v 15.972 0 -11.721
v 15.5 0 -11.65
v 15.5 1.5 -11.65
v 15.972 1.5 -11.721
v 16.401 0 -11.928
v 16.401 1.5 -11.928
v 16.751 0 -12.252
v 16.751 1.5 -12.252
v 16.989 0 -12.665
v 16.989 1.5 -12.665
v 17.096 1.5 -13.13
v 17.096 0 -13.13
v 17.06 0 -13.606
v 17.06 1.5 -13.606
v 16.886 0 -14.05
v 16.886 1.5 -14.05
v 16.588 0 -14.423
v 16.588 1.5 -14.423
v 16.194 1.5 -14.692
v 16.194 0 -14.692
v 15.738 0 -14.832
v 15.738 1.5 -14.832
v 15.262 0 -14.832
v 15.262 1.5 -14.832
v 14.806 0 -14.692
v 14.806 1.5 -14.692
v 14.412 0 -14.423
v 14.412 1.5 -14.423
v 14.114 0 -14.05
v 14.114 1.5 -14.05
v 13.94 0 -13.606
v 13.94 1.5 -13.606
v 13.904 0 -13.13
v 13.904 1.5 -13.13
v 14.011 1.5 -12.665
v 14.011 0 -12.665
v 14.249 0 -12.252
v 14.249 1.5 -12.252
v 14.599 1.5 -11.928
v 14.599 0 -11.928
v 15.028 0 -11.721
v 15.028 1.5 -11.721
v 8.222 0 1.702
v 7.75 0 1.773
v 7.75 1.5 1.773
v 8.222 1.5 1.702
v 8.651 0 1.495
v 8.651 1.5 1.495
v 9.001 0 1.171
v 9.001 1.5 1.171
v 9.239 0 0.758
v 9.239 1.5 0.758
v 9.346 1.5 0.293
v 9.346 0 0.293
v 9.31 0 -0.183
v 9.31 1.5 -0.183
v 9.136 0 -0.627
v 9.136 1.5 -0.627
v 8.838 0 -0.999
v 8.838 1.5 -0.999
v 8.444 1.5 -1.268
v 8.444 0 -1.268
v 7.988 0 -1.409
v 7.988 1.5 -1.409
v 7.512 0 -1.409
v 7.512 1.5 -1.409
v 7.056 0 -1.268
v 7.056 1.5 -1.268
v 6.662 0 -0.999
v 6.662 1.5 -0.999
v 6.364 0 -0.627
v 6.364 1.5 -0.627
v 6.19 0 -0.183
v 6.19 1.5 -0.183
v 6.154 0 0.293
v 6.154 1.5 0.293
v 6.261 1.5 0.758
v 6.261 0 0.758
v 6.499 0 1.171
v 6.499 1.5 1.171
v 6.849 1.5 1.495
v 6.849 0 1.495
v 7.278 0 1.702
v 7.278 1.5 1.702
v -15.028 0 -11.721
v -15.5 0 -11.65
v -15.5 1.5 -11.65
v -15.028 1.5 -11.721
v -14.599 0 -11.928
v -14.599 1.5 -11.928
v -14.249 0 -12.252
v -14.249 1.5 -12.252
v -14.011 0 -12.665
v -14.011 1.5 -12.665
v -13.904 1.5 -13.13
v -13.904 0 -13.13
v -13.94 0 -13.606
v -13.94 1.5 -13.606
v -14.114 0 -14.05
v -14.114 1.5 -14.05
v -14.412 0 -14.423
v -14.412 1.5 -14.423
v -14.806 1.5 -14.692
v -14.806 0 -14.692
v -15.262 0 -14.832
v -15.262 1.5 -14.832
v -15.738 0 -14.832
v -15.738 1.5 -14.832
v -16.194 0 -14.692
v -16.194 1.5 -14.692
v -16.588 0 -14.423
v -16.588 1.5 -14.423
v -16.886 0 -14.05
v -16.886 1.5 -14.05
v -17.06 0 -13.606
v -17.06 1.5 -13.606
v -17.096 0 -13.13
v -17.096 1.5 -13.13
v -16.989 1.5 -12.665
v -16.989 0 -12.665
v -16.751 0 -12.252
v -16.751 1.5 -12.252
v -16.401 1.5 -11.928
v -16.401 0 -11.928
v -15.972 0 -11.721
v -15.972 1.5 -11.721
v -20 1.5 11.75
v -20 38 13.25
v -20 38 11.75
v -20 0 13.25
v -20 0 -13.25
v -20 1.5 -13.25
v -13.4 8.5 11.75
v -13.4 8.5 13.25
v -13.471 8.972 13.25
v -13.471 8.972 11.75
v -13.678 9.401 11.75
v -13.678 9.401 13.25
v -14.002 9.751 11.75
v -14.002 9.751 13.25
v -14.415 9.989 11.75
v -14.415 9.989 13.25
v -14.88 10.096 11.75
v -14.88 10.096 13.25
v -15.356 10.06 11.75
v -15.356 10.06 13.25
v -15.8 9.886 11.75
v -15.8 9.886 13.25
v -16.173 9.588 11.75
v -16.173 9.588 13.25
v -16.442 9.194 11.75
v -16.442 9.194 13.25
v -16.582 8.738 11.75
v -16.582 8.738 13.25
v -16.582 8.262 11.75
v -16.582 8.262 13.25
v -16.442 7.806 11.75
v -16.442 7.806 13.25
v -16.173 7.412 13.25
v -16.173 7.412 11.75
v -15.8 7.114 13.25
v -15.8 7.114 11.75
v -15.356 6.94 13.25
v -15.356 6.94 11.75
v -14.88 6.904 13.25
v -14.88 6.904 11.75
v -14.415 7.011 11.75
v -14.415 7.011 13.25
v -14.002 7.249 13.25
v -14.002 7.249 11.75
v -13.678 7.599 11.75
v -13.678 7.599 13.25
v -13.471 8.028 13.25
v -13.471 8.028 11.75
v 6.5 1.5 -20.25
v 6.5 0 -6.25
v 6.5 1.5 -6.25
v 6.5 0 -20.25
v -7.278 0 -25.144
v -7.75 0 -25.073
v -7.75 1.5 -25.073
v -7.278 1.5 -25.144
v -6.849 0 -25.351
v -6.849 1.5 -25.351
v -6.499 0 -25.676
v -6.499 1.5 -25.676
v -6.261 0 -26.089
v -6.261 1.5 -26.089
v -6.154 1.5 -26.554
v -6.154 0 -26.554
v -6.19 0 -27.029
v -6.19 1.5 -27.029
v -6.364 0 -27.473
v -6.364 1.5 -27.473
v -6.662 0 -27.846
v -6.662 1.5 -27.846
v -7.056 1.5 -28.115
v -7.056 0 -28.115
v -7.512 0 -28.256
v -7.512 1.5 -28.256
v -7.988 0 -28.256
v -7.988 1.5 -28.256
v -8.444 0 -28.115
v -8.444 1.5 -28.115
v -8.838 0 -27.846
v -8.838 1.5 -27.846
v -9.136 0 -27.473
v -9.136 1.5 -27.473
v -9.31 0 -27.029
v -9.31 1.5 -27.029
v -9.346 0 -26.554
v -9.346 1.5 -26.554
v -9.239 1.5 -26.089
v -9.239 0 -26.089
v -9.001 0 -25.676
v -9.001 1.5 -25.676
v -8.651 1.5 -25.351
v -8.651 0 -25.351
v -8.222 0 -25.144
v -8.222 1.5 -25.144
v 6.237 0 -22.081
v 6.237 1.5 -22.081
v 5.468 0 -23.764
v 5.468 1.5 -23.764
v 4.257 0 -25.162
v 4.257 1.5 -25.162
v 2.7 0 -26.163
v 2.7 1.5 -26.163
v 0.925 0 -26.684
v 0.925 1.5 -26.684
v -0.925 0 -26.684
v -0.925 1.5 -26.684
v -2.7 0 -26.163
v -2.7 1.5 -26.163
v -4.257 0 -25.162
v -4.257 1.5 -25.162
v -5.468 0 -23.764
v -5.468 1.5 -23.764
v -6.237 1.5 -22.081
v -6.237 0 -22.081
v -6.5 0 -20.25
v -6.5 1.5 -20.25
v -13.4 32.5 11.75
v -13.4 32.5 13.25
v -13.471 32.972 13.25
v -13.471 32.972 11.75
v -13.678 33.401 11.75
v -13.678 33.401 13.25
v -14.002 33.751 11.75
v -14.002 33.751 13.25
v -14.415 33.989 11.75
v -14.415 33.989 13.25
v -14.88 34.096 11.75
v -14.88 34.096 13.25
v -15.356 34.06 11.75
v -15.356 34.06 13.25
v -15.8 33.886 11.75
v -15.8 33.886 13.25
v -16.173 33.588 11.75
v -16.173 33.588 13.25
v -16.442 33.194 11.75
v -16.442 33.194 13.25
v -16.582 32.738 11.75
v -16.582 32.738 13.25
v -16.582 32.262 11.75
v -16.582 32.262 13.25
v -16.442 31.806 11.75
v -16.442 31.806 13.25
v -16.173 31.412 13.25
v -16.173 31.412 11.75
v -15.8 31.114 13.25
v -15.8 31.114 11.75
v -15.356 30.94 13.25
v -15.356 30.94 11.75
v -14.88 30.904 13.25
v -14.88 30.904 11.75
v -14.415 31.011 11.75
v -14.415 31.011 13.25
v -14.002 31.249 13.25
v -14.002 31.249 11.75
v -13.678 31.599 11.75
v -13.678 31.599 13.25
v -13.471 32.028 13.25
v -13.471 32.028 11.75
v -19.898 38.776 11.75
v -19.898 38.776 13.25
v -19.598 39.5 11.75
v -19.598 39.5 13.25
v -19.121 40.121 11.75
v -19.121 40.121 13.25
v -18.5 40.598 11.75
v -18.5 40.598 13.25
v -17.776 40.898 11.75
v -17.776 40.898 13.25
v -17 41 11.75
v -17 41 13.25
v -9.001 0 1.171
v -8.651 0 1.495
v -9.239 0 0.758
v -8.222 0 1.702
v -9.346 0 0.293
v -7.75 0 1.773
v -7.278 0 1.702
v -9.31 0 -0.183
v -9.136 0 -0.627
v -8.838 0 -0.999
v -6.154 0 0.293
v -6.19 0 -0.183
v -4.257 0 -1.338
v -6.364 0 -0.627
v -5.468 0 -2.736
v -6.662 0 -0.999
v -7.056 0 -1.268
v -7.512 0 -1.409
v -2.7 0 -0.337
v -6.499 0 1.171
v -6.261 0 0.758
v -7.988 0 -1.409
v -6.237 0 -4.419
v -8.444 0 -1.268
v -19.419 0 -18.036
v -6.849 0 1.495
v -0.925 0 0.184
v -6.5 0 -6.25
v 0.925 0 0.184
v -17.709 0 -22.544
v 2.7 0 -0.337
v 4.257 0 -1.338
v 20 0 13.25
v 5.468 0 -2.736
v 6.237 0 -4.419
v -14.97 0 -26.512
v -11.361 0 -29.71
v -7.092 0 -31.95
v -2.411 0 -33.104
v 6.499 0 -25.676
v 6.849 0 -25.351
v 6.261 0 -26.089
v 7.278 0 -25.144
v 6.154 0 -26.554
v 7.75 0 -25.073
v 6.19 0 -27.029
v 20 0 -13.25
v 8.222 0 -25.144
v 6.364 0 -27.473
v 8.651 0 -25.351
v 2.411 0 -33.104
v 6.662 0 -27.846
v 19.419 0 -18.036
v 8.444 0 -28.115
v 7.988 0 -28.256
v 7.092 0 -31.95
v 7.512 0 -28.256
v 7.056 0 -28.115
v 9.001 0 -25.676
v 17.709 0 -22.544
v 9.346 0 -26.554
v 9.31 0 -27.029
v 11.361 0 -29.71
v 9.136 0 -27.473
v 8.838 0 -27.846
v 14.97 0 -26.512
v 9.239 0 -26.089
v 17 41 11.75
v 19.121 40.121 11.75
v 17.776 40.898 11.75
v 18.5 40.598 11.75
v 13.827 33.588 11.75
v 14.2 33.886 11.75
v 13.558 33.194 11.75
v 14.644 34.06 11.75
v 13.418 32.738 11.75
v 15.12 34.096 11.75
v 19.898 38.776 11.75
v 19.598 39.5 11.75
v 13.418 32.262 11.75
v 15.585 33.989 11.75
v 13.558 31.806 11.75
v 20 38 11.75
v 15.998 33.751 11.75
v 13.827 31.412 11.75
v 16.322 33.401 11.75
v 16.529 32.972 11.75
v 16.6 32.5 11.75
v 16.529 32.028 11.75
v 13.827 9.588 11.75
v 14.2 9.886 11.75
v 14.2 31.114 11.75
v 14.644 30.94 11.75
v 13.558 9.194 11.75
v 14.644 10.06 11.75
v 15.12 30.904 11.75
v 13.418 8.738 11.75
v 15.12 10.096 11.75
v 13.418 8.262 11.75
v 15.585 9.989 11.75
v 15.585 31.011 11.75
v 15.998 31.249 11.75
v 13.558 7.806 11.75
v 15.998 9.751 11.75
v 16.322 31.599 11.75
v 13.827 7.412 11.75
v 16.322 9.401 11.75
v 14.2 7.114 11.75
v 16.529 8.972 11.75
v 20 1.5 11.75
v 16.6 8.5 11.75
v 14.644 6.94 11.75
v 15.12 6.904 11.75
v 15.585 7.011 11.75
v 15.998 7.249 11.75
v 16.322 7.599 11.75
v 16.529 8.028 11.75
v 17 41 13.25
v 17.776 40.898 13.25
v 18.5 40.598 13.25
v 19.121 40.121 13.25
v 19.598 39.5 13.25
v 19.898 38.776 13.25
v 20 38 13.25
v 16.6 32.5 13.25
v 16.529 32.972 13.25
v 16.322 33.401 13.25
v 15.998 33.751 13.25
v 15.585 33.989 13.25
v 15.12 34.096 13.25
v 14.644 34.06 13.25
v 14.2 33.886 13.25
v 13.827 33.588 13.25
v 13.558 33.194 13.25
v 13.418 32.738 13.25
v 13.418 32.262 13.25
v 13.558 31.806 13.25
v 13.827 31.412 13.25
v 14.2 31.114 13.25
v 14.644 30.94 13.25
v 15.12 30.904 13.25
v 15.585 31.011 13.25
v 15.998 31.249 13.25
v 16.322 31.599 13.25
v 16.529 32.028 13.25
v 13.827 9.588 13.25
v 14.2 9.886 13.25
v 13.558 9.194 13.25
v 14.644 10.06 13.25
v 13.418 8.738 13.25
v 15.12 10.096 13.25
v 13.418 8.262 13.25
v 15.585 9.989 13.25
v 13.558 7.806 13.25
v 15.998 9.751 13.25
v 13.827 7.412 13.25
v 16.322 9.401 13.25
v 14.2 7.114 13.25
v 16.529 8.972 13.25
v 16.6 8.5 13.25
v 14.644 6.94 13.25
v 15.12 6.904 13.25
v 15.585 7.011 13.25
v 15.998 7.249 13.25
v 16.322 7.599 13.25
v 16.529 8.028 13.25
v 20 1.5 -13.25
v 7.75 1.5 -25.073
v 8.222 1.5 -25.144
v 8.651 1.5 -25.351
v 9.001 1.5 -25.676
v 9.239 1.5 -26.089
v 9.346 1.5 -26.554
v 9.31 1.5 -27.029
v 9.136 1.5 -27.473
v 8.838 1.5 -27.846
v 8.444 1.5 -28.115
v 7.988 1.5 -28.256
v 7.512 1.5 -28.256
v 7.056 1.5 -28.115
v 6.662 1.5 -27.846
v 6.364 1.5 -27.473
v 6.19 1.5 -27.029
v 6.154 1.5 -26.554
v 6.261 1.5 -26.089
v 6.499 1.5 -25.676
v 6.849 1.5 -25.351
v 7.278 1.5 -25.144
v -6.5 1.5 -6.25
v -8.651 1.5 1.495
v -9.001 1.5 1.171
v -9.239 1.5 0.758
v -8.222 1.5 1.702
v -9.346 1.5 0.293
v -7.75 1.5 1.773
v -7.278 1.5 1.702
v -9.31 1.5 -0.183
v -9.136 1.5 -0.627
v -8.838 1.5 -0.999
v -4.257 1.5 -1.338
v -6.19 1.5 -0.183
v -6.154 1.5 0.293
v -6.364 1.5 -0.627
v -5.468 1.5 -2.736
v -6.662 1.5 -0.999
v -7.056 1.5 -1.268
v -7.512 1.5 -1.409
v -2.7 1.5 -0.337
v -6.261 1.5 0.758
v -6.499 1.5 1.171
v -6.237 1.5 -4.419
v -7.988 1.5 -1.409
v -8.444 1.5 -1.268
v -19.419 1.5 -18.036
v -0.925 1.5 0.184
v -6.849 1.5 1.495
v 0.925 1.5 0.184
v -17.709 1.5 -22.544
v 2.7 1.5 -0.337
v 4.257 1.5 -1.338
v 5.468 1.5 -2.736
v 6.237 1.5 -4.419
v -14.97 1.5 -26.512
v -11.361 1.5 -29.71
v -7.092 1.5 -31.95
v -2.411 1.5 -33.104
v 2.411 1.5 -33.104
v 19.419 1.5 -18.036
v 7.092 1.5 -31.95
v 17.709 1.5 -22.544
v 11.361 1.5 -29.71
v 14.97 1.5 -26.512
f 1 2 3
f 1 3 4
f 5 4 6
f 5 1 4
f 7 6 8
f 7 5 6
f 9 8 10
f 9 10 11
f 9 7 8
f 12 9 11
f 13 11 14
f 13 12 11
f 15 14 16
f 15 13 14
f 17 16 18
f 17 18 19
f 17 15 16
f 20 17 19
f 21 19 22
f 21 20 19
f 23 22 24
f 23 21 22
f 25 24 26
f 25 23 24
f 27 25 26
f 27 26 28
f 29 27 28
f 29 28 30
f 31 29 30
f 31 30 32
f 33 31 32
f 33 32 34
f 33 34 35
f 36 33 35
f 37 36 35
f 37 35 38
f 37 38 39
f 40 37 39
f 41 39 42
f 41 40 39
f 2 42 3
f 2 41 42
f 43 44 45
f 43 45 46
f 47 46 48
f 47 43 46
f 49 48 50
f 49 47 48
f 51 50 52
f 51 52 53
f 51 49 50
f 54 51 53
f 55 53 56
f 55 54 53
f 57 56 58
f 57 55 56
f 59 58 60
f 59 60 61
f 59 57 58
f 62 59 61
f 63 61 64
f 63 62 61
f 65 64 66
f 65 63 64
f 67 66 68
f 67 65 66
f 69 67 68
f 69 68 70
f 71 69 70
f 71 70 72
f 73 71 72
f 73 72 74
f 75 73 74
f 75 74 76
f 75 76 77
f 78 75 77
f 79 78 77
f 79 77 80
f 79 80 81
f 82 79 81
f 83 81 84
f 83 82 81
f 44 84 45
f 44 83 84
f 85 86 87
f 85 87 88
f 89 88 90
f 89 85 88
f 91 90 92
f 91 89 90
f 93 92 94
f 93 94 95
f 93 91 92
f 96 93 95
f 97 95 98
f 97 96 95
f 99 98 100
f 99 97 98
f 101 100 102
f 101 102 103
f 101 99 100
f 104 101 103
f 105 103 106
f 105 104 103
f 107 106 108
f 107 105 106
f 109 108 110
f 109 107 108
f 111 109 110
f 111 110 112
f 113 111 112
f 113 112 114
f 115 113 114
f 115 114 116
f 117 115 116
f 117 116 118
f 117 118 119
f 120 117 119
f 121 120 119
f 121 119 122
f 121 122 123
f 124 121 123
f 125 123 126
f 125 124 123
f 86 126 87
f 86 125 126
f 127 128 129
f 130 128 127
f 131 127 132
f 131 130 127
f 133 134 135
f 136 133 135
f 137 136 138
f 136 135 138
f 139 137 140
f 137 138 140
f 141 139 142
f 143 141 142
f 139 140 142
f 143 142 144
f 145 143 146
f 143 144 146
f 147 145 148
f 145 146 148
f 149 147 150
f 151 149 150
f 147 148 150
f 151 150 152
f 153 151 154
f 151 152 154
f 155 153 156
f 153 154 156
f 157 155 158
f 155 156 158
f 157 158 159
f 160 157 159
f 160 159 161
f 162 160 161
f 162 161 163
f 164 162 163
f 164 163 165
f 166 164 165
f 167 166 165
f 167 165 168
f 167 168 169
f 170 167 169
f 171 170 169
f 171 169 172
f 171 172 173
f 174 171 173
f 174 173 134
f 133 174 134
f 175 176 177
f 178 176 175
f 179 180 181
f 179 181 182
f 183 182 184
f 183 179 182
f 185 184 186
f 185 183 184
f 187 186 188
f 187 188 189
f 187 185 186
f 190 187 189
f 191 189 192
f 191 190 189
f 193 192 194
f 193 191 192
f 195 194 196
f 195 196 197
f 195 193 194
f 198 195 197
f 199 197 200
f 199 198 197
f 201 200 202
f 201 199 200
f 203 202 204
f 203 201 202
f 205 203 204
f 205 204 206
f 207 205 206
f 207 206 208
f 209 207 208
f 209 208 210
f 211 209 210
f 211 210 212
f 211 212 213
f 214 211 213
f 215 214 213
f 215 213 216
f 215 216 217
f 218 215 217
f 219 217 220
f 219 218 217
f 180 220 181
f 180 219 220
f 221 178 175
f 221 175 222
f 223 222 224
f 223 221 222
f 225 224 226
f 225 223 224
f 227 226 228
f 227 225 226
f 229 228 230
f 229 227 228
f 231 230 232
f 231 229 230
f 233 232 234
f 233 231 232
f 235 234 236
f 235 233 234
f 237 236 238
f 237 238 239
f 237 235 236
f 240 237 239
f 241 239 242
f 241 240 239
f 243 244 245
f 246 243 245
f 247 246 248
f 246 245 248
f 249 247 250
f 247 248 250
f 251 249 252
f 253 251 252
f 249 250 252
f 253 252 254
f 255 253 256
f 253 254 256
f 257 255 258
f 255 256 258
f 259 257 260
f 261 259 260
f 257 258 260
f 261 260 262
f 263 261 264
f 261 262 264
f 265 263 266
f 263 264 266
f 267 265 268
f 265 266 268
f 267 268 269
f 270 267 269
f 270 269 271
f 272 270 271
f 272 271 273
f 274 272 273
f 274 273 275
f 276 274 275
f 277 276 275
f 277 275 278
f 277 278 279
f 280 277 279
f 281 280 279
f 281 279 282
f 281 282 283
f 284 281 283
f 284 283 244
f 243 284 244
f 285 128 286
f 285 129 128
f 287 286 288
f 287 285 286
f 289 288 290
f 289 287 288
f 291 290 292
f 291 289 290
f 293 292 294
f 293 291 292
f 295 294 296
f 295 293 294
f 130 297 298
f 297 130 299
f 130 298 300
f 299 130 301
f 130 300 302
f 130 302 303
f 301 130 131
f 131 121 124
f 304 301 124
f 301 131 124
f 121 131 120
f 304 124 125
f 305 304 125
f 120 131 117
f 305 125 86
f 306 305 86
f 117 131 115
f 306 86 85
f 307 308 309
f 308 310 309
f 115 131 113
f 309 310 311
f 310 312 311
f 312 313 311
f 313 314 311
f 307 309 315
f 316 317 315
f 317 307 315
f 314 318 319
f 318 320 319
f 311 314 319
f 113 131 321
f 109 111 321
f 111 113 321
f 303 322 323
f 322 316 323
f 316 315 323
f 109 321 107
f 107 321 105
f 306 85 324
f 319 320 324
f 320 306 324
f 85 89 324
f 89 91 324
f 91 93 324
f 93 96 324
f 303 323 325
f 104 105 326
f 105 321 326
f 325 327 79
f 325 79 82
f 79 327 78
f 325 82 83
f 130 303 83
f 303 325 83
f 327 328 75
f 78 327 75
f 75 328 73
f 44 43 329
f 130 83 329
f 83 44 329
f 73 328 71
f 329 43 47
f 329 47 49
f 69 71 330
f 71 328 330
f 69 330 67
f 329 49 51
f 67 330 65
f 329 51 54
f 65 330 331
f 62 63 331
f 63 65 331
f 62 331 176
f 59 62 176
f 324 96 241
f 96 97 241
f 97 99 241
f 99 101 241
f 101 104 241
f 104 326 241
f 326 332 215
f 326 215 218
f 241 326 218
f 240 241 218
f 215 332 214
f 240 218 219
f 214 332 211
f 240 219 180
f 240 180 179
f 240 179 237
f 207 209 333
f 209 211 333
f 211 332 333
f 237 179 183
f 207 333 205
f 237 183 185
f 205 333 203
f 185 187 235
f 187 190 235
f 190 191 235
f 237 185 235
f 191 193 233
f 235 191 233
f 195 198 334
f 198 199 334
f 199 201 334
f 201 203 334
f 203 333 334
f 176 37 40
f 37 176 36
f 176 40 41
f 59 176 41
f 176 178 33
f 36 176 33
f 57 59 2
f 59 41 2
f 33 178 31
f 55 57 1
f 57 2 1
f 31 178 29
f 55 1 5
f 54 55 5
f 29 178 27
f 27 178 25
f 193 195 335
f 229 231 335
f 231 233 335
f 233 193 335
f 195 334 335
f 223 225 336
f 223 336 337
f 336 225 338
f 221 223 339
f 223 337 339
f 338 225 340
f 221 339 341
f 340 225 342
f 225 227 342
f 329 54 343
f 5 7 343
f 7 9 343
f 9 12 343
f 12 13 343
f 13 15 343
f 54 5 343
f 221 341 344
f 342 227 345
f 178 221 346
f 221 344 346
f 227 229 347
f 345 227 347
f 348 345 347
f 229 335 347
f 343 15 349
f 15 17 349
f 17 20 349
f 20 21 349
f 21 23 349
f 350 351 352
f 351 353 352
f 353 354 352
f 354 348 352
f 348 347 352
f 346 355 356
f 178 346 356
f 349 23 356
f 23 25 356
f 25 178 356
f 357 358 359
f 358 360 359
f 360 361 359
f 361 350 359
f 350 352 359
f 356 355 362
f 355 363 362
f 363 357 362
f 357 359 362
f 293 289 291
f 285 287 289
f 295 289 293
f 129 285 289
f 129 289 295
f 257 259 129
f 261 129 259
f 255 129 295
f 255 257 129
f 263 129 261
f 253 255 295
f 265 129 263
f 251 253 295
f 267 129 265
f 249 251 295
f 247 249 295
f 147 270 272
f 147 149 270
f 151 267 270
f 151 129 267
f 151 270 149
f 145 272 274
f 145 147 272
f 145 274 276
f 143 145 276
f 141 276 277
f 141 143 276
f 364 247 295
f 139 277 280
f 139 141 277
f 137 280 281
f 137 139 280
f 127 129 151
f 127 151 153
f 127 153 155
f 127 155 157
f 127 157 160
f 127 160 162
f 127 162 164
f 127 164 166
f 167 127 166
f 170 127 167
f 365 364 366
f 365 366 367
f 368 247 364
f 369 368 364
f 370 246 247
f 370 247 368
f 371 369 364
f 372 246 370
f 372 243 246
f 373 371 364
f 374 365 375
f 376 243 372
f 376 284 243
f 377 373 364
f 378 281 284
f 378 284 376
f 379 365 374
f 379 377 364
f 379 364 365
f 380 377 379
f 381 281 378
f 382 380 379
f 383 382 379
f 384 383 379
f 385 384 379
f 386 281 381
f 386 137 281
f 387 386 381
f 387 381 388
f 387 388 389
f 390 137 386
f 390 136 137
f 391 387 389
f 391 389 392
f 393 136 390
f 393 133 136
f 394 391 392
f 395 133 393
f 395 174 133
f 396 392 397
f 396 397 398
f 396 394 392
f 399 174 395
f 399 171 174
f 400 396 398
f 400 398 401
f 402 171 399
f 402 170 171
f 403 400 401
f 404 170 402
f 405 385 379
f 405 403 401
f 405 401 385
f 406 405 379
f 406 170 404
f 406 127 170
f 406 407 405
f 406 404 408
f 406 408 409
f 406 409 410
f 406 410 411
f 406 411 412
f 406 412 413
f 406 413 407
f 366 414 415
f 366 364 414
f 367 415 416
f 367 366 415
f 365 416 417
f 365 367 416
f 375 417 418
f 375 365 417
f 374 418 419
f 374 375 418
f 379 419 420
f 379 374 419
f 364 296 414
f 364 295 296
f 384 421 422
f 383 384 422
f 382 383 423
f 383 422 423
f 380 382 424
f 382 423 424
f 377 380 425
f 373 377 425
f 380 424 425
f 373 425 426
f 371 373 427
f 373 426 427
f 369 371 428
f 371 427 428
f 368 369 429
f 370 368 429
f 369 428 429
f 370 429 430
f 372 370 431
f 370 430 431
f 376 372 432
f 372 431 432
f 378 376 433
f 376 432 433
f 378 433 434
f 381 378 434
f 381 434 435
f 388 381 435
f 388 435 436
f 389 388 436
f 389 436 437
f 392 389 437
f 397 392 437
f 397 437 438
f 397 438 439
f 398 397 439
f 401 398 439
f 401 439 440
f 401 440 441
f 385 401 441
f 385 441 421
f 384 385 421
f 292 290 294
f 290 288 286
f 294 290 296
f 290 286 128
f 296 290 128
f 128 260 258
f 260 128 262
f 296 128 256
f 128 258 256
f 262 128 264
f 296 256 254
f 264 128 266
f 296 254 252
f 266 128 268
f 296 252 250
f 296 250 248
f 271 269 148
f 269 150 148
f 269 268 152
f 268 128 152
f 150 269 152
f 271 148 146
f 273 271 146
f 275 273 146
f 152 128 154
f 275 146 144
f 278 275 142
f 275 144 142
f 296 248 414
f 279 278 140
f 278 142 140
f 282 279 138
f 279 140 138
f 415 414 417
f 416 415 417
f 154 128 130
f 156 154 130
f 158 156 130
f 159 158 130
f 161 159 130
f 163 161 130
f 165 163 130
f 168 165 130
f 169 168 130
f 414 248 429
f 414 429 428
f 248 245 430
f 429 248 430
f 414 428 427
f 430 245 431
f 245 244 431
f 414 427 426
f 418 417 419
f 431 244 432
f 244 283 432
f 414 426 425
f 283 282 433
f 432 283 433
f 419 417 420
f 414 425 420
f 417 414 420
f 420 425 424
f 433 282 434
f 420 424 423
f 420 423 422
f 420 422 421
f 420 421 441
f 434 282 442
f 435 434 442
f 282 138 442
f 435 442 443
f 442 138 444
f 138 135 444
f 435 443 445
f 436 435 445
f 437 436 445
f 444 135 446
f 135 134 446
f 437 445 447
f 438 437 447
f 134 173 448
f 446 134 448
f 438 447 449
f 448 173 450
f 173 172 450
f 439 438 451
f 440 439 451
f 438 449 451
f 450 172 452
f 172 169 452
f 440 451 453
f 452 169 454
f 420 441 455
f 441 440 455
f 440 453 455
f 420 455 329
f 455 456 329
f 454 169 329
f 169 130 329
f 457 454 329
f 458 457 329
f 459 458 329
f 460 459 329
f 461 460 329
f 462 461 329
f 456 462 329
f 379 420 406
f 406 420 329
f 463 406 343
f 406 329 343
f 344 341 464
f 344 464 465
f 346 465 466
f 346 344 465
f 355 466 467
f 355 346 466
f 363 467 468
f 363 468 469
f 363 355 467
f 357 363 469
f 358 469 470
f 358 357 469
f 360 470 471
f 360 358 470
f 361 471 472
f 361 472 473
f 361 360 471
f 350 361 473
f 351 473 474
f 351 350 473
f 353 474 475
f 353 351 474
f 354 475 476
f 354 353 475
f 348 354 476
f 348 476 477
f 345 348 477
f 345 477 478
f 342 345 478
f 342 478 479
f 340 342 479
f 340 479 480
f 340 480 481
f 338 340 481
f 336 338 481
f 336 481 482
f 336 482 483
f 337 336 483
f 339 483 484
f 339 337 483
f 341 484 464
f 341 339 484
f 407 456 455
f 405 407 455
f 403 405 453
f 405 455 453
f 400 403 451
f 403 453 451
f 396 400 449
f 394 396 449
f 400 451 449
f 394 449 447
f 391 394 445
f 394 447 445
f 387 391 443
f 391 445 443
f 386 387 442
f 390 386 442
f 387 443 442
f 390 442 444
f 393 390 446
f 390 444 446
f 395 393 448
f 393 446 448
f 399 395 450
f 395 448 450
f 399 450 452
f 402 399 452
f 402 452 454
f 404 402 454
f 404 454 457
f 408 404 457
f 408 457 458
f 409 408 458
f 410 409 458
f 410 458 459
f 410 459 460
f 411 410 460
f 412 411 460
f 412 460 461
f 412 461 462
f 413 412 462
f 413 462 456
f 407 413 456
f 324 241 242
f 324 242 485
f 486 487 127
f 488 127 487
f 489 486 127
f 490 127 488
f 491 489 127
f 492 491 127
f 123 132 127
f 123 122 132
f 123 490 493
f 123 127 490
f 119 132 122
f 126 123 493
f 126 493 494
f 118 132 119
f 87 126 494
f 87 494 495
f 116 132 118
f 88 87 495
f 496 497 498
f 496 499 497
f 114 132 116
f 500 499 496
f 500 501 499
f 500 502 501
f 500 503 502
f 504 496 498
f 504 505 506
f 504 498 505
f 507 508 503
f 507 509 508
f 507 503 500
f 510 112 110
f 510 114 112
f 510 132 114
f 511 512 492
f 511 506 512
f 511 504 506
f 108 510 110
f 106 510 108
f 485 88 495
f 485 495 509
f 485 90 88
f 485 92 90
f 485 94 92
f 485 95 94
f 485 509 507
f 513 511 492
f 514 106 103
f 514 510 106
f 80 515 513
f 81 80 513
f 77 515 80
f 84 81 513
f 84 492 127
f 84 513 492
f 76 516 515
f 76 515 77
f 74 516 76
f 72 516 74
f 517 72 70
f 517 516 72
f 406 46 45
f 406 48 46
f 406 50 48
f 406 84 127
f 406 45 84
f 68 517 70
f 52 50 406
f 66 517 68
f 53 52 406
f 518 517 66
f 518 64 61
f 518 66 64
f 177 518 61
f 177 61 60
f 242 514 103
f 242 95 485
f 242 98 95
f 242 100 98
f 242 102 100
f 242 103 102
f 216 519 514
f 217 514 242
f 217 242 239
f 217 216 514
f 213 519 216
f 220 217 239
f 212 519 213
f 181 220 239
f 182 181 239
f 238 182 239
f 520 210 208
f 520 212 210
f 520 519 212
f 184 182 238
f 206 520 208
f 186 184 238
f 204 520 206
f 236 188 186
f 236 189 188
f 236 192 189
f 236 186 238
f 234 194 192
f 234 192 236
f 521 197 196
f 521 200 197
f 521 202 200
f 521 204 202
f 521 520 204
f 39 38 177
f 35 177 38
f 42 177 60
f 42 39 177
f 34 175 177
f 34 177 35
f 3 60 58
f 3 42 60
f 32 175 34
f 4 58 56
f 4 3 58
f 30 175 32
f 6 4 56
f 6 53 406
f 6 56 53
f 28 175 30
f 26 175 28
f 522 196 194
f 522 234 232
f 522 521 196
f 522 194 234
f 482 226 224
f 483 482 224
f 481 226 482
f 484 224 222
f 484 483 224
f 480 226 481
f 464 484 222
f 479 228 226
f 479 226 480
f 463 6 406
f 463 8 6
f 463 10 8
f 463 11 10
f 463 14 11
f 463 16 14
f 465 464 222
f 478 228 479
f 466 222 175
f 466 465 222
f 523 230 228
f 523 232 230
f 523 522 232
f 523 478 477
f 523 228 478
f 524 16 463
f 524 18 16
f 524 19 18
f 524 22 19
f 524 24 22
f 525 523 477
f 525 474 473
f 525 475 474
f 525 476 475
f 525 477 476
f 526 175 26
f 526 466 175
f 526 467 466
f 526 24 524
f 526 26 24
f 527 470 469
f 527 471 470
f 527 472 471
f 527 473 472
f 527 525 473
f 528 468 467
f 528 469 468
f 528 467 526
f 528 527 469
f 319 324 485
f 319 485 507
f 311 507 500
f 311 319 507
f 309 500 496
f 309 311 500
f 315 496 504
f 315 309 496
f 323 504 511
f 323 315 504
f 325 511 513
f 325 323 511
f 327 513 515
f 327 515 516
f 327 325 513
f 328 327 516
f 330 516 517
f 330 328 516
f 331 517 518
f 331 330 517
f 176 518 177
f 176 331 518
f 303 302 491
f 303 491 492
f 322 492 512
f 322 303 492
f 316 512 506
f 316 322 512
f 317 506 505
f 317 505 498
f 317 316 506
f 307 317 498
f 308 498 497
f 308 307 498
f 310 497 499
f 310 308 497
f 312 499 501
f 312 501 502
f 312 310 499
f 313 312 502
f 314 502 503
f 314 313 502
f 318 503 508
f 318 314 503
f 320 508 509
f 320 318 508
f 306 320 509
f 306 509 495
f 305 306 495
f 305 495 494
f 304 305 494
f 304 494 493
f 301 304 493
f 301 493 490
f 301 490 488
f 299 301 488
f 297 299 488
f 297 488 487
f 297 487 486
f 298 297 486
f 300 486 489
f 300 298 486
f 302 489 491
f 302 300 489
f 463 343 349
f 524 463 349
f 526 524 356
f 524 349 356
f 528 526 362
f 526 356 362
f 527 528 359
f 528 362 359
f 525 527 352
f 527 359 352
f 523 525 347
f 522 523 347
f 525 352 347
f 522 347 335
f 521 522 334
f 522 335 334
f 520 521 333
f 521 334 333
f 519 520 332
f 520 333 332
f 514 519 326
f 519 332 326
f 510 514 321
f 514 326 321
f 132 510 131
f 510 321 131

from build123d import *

# Parameters (mm, degrees)
SKETCH_1_R          = 1.6
EXTRUDE_1_DEPTH     = 1.5
SKETCH_3_W          = 40
SKETCH_3_H          = 1.5
EXTRUDE_2_DEPTH     = 39.5
CUT_EXTRUDE_1_REACH = 67.14
SKETCH_4_R          = 1.6
FILLET_1_R          = 3


with BuildPart() as part:
    # 草图1 → 凸台-拉伸1 (new body)
    with BuildSketch(Plane(origin=(0, 0, 0), x_dir=(1, 0, 0), z_dir=(0, 1, 0))):
        with BuildLine():
            Line((-20, -13.25), (20, -13.25))
            Line((20, -13.25), (20, 13.25))
            ThreePointArc((20, 13.25), (0, 33.25), (-20, 13.25))
            Line((-20, 13.25), (-20, -13.25))
        make_face()
        with Locations(Location((15.5, 13.25, 0), (0, 0, 270))):
            Circle(SKETCH_1_R, mode=Mode.SUBTRACT)
        with Locations(Location((7.75, -0.173393759, 0), (0, 0, 270))):
            Circle(SKETCH_1_R, mode=Mode.SUBTRACT)
        with Locations(Location((-7.75, -0.173393759, 0), (0, 0, 270))):
            Circle(SKETCH_1_R, mode=Mode.SUBTRACT)
        with Locations(Location((-15.5, 13.25, 0), (0, 0, 270))):
            Circle(SKETCH_1_R, mode=Mode.SUBTRACT)
        with Locations(Location((-7.75, 26.673393759, 0), (0, 0, 270))):
            Circle(SKETCH_1_R, mode=Mode.SUBTRACT)
        with Locations(Location((7.75, 26.673393759, 0), (0, 0, 270))):
            Circle(SKETCH_1_R, mode=Mode.SUBTRACT)
        with BuildLine():
            Line((-6.5, 20.25), (-6.5, 6.25))
            ThreePointArc((-6.5, 6.25), (0, -0.25), (6.5, 6.25))
            Line((6.5, 6.25), (6.5, 20.25))
            ThreePointArc((6.5, 20.25), (0, 26.75), (-6.5, 20.25))
        make_face(mode=Mode.SUBTRACT)
    extrude(amount=EXTRUDE_1_DEPTH)

    # 草图3 → 凸台-拉伸2 (add)
    with BuildSketch(Plane(origin=(0, 1.5, 0), x_dir=(1, 0, 0), z_dir=(0, 1, 0))):
        with Locations((0, -12.5)):
            Rectangle(SKETCH_3_W, SKETCH_3_H)
    extrude(amount=EXTRUDE_2_DEPTH)

    # 草图4 → 切除-拉伸1 (cut, up to next)
    with BuildSketch(Plane.XY.offset(13.25), mode=Mode.PRIVATE) as cut_extrude_1_sk1:
        with Locations((-15, 32.5)):
            Circle(SKETCH_4_R)
    cut_extrude_1_tool1 = extrude(cut_extrude_1_sk1.sketch, amount=-CUT_EXTRUDE_1_REACH, mode=Mode.PRIVATE) & part.part
    # 草图4 → 切除-拉伸1 (cut, up to next)
    with BuildSketch(Plane.XY.offset(13.25), mode=Mode.PRIVATE) as cut_extrude_1_sk2:
        with Locations((15, 32.5)):
            Circle(SKETCH_4_R)
    cut_extrude_1_tool2 = extrude(cut_extrude_1_sk2.sketch, amount=-CUT_EXTRUDE_1_REACH, mode=Mode.PRIVATE) & part.part
    # 草图4 → 切除-拉伸1 (cut, up to next)
    with BuildSketch(Plane.XY.offset(13.25), mode=Mode.PRIVATE) as cut_extrude_1_sk3:
        with Locations((15, 8.5)):
            Circle(SKETCH_4_R)
    cut_extrude_1_tool3 = extrude(cut_extrude_1_sk3.sketch, amount=-CUT_EXTRUDE_1_REACH, mode=Mode.PRIVATE) & part.part
    # 草图4 → 切除-拉伸1 (cut, up to next)
    with BuildSketch(Plane.XY.offset(13.25), mode=Mode.PRIVATE) as cut_extrude_1_sk4:
        with Locations((-15, 8.5)):
            Circle(SKETCH_4_R)
    cut_extrude_1_tool4 = extrude(cut_extrude_1_sk4.sketch, amount=-CUT_EXTRUDE_1_REACH, mode=Mode.PRIVATE) & part.part
    add(cut_extrude_1_tool1.solids().sort_by_distance((-15, 32.5, 13.25))[0], mode=Mode.SUBTRACT)
    add(cut_extrude_1_tool2.solids().sort_by_distance((15, 32.5, 13.25))[0], mode=Mode.SUBTRACT)
    add(cut_extrude_1_tool3.solids().sort_by_distance((15, 8.5, 13.25))[0], mode=Mode.SUBTRACT)
    add(cut_extrude_1_tool4.solids().sort_by_distance((-15, 8.5, 13.25))[0], mode=Mode.SUBTRACT)

    # 圆角1
    fillet_1_edges = [part.edges().sort_by_distance(p)[0] for p in [
        (-20, 41, 12.5),
        (20, 41, 12.5),
    ]]
    fillet(fillet_1_edges, radius=FILLET_1_R)


solid = part.part
